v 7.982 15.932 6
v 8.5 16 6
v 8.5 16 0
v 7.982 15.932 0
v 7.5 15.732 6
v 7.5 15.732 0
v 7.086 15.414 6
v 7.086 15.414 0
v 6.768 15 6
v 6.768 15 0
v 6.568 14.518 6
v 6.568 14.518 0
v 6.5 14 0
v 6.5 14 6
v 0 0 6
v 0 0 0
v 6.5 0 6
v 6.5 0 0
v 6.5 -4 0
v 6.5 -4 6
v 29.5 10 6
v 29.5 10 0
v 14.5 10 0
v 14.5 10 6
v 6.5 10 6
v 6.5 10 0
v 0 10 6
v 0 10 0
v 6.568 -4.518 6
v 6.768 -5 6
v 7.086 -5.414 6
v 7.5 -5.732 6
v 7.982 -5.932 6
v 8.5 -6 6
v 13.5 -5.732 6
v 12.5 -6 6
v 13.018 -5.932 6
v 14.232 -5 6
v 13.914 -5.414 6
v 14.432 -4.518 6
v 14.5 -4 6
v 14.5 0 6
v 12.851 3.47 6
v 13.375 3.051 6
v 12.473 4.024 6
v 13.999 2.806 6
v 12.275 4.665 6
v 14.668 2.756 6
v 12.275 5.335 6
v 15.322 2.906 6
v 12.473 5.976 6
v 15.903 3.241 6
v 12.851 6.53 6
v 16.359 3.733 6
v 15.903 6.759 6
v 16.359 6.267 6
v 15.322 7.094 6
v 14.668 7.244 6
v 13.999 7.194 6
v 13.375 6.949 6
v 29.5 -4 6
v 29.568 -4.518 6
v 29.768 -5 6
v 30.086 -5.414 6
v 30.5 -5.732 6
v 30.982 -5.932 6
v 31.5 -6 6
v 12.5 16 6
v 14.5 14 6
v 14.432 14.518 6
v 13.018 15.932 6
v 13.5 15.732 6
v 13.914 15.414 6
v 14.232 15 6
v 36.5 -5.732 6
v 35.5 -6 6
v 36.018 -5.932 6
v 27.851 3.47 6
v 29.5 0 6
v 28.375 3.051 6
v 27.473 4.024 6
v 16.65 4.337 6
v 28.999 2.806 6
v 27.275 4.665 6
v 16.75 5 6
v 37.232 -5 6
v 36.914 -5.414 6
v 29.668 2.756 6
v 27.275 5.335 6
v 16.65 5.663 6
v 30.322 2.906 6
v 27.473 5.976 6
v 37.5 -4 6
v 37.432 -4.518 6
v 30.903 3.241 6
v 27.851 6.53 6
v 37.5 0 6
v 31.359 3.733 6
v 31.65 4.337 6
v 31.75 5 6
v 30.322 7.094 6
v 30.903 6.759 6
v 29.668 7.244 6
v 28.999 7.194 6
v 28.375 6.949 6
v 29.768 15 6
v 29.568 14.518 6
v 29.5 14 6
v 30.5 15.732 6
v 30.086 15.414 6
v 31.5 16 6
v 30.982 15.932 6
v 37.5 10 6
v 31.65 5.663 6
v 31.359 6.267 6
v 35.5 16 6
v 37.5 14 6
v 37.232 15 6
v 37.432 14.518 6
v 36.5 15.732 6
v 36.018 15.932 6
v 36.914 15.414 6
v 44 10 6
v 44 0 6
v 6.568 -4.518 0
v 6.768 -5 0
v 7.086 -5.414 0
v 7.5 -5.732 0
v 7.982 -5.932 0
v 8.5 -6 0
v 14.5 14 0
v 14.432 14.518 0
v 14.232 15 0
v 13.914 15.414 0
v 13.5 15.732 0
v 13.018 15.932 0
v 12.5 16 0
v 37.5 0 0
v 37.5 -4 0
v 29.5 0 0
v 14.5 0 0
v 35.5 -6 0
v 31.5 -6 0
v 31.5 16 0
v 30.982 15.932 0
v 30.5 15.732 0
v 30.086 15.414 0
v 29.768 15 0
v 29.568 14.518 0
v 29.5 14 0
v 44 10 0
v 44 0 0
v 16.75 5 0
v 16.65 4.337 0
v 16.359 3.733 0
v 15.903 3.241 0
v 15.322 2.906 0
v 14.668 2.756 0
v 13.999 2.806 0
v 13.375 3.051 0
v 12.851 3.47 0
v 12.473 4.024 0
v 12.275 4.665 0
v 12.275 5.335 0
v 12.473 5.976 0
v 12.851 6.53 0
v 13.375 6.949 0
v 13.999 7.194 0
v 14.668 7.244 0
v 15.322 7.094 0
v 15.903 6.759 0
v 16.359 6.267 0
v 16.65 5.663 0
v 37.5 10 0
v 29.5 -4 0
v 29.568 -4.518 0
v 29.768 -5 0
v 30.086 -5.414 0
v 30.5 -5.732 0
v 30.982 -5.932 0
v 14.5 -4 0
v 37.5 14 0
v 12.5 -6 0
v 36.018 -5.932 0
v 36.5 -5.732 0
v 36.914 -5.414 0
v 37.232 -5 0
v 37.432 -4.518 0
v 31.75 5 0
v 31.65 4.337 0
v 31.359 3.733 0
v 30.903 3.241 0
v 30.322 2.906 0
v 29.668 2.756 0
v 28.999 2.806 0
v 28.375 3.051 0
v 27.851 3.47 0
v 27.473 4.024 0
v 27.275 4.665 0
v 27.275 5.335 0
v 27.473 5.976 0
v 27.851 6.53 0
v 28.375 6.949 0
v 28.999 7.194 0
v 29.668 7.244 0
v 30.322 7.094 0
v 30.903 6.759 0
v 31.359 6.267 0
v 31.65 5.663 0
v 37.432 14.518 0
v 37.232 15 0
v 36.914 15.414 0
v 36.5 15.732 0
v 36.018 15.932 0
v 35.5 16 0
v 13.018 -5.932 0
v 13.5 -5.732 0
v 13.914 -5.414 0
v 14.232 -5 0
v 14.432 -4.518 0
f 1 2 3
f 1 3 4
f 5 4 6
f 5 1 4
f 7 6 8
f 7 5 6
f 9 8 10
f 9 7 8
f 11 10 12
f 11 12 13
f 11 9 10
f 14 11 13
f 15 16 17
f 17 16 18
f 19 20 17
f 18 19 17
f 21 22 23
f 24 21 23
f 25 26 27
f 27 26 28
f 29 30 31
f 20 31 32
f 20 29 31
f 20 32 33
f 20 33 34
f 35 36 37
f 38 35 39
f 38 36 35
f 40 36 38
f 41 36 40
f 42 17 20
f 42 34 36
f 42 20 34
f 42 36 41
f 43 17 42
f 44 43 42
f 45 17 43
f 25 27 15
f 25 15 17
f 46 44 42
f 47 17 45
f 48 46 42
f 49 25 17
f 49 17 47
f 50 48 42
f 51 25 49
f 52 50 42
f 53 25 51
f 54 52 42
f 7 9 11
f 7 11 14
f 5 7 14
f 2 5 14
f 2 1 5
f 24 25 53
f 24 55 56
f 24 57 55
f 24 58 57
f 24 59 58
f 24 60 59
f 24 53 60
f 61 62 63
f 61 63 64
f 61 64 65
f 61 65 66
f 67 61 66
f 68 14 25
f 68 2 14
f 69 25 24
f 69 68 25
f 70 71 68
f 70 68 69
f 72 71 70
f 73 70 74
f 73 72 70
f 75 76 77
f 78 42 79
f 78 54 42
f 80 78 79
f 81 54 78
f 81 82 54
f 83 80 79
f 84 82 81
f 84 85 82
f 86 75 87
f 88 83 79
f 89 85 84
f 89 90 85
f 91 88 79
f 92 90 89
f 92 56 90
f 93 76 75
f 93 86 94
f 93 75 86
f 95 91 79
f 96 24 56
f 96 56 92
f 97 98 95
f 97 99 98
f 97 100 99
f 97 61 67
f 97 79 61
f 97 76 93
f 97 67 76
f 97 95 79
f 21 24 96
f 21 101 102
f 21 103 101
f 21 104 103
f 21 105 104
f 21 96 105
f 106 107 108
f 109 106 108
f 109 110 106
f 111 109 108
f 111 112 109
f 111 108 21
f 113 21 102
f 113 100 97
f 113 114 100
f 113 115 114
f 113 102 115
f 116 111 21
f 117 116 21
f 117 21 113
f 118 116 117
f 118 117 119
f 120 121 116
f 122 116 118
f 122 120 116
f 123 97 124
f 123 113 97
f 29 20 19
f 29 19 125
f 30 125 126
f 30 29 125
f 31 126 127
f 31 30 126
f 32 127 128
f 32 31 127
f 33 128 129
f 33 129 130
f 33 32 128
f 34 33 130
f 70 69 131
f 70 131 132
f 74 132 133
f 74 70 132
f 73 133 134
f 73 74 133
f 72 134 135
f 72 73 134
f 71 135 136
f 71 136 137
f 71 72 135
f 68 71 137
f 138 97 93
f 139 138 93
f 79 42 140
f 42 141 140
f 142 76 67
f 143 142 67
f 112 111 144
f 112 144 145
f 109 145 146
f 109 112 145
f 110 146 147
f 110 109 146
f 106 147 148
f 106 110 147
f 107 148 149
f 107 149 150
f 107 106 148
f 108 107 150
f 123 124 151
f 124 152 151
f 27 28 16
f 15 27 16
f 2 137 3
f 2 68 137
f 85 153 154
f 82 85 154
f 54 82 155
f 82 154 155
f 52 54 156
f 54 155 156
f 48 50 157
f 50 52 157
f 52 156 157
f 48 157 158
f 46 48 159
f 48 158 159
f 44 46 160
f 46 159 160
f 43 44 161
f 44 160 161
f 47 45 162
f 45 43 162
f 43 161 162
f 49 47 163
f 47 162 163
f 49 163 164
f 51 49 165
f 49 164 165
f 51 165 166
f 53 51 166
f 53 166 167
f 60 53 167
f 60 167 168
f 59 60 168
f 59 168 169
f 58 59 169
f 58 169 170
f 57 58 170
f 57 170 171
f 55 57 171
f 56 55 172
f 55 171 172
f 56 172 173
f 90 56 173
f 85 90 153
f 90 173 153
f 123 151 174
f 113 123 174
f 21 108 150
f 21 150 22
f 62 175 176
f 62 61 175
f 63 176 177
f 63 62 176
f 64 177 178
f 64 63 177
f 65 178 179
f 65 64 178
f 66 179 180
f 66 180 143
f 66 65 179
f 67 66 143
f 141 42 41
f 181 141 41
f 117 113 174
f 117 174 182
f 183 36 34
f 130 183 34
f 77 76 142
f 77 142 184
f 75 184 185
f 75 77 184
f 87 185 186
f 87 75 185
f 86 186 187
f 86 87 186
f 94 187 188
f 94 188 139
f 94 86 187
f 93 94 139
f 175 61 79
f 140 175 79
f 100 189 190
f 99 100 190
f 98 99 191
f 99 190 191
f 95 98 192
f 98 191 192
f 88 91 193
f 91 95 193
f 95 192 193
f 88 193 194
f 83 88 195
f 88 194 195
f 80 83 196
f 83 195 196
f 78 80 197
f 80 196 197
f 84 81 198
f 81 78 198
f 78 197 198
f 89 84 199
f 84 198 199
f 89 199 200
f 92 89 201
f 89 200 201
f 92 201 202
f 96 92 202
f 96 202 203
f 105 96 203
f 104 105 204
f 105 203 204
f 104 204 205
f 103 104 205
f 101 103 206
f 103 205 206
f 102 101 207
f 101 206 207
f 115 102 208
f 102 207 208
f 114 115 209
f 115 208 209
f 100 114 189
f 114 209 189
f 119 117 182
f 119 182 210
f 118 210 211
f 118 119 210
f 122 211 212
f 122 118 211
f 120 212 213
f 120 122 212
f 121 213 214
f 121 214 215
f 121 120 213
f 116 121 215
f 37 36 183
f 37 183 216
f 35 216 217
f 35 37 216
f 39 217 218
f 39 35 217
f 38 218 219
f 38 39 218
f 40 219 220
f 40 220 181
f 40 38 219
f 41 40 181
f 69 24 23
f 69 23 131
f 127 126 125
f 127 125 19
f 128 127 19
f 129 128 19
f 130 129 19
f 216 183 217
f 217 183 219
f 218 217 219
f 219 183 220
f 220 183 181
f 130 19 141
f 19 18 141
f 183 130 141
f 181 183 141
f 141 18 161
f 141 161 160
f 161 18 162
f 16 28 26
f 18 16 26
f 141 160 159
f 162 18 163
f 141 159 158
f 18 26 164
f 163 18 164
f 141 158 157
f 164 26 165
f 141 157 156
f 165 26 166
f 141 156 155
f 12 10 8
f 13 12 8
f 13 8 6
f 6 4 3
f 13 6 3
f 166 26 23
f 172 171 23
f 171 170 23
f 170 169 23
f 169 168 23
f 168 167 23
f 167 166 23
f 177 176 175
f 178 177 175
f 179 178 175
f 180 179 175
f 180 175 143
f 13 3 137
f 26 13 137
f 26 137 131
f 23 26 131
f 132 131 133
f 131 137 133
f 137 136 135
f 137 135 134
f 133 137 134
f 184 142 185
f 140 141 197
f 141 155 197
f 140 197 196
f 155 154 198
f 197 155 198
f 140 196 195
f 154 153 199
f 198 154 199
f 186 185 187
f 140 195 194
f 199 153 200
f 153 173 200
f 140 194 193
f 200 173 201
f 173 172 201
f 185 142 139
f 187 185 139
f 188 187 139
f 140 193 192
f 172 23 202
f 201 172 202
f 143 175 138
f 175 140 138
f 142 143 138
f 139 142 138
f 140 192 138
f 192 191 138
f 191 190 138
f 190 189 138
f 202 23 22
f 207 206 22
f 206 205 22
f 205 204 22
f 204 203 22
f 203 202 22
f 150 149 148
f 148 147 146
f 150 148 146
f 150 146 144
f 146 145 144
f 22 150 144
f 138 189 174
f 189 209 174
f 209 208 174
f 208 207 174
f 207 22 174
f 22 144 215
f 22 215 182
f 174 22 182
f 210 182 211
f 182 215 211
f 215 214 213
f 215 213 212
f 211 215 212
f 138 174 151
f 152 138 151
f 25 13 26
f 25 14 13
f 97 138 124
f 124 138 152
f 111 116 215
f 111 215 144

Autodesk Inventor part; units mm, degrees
ref_plane "YZ Plane" through (0, 0, 0) normal (1, 0, 0) x (0, 1, 0)
ref_plane "XZ Plane" through (0, 0, 0) normal (0, 1, 0) x (-1, 0, 0)
ref_plane "XY Plane" through (0, 0, 0) normal (0, 0, 1) x (1, 0, 0)
sketch "Sketch1" plane through (0, 0, 0) normal (0, 0, 1) x (1, 0, 0)
  line L0 (0, 0) -> (44, 0)
  line L1 (44, 0) -> (44, 10)
  line L2 (44, 10) -> (0, 10)
  line L3 (0, 10) -> (0, 0)
  circle A0 centre (29.5, 5) radius 2.25
  circle A1 centre (14.5, 5) radius 2.25
  line L4 (14.5, 5) -> (29.5, 5) construction
  point P0 (0, 5)
  point P1 (22, 5)
  point P2 (22, 10)
  dimension "d0" = 10
  dimension "d1" = 44
  dimension "d2" = 4.5
  dimension "d13" = 4.5
  dimension "d14" = 15
extrude "Extrusion3" add sketch "Sketch1" along normal blind 6
sketch "Sketch3" plane through (0, 0, 6) normal (0, 0, 1) x (1, 0, 0)
  line L0 (0, 0) -> (44, 0) projected
  line L1 (44, 10) -> (0, 10) projected
  line L2 (6.5, 10) -> (14.5, 10)
  line L3 (14.5, 10) -> (14.5, 14)
  line L4 (12.5, 16) -> (8.5, 16)
  line L5 (6.5, 14) -> (6.5, 10)
  line L6 (29.5, 10) -> (37.5, 10)
  line L7 (37.5, 10) -> (37.5, 14)
  line L8 (35.5, 16) -> (31.5, 16)
  line L9 (29.5, 14) -> (29.5, 10)
  line L10 (6.5, 0) -> (14.5, 0)
  line L11 (14.5, 0) -> (14.5, -4)
  line L12 (12.5, -6) -> (8.5, -6)
  line L13 (6.5, -4) -> (6.5, 0)
  line L14 (29.5, 0) -> (37.5, 0)
  line L15 (37.5, 0) -> (37.5, -4)
  line L16 (35.5, -6) -> (31.5, -6)
  line L17 (29.5, -4) -> (29.5, 0)
  arc A0 (8.5, 16) -> (6.5, 14) centre (8.5, 14) ccw
  arc A1 (14.5, 14) -> (12.5, 16) centre (12.5, 14) ccw
  arc A2 (31.5, 16) -> (29.5, 14) centre (31.5, 14) ccw
  arc A3 (37.5, 14) -> (35.5, 16) centre (35.5, 14) ccw
  arc A4 (6.5, -4) -> (8.5, -6) centre (8.5, -4) ccw
  arc A5 (12.5, -6) -> (14.5, -4) centre (12.5, -4) ccw
  arc A6 (29.5, -4) -> (31.5, -6) centre (31.5, -4) ccw
  arc A7 (35.5, -6) -> (37.5, -4) centre (35.5, -4) ccw
  line L18 (14.5, 12.5251) -> (29.5, 12.5251) construction
  point P0 (22, 12.5251)
  point P1 (22, 10)
  dimension "d17" = 2
  dimension "d18" = 8
  dimension "d19" = 8
  dimension "d20" = 6
  dimension "d21" = 6
  dimension "d22" = 15
extrude "Extrusion4" add sketch "Sketch3" against normal blind 6
properties part number "y_carriage_belt_mount_bed_holder"
